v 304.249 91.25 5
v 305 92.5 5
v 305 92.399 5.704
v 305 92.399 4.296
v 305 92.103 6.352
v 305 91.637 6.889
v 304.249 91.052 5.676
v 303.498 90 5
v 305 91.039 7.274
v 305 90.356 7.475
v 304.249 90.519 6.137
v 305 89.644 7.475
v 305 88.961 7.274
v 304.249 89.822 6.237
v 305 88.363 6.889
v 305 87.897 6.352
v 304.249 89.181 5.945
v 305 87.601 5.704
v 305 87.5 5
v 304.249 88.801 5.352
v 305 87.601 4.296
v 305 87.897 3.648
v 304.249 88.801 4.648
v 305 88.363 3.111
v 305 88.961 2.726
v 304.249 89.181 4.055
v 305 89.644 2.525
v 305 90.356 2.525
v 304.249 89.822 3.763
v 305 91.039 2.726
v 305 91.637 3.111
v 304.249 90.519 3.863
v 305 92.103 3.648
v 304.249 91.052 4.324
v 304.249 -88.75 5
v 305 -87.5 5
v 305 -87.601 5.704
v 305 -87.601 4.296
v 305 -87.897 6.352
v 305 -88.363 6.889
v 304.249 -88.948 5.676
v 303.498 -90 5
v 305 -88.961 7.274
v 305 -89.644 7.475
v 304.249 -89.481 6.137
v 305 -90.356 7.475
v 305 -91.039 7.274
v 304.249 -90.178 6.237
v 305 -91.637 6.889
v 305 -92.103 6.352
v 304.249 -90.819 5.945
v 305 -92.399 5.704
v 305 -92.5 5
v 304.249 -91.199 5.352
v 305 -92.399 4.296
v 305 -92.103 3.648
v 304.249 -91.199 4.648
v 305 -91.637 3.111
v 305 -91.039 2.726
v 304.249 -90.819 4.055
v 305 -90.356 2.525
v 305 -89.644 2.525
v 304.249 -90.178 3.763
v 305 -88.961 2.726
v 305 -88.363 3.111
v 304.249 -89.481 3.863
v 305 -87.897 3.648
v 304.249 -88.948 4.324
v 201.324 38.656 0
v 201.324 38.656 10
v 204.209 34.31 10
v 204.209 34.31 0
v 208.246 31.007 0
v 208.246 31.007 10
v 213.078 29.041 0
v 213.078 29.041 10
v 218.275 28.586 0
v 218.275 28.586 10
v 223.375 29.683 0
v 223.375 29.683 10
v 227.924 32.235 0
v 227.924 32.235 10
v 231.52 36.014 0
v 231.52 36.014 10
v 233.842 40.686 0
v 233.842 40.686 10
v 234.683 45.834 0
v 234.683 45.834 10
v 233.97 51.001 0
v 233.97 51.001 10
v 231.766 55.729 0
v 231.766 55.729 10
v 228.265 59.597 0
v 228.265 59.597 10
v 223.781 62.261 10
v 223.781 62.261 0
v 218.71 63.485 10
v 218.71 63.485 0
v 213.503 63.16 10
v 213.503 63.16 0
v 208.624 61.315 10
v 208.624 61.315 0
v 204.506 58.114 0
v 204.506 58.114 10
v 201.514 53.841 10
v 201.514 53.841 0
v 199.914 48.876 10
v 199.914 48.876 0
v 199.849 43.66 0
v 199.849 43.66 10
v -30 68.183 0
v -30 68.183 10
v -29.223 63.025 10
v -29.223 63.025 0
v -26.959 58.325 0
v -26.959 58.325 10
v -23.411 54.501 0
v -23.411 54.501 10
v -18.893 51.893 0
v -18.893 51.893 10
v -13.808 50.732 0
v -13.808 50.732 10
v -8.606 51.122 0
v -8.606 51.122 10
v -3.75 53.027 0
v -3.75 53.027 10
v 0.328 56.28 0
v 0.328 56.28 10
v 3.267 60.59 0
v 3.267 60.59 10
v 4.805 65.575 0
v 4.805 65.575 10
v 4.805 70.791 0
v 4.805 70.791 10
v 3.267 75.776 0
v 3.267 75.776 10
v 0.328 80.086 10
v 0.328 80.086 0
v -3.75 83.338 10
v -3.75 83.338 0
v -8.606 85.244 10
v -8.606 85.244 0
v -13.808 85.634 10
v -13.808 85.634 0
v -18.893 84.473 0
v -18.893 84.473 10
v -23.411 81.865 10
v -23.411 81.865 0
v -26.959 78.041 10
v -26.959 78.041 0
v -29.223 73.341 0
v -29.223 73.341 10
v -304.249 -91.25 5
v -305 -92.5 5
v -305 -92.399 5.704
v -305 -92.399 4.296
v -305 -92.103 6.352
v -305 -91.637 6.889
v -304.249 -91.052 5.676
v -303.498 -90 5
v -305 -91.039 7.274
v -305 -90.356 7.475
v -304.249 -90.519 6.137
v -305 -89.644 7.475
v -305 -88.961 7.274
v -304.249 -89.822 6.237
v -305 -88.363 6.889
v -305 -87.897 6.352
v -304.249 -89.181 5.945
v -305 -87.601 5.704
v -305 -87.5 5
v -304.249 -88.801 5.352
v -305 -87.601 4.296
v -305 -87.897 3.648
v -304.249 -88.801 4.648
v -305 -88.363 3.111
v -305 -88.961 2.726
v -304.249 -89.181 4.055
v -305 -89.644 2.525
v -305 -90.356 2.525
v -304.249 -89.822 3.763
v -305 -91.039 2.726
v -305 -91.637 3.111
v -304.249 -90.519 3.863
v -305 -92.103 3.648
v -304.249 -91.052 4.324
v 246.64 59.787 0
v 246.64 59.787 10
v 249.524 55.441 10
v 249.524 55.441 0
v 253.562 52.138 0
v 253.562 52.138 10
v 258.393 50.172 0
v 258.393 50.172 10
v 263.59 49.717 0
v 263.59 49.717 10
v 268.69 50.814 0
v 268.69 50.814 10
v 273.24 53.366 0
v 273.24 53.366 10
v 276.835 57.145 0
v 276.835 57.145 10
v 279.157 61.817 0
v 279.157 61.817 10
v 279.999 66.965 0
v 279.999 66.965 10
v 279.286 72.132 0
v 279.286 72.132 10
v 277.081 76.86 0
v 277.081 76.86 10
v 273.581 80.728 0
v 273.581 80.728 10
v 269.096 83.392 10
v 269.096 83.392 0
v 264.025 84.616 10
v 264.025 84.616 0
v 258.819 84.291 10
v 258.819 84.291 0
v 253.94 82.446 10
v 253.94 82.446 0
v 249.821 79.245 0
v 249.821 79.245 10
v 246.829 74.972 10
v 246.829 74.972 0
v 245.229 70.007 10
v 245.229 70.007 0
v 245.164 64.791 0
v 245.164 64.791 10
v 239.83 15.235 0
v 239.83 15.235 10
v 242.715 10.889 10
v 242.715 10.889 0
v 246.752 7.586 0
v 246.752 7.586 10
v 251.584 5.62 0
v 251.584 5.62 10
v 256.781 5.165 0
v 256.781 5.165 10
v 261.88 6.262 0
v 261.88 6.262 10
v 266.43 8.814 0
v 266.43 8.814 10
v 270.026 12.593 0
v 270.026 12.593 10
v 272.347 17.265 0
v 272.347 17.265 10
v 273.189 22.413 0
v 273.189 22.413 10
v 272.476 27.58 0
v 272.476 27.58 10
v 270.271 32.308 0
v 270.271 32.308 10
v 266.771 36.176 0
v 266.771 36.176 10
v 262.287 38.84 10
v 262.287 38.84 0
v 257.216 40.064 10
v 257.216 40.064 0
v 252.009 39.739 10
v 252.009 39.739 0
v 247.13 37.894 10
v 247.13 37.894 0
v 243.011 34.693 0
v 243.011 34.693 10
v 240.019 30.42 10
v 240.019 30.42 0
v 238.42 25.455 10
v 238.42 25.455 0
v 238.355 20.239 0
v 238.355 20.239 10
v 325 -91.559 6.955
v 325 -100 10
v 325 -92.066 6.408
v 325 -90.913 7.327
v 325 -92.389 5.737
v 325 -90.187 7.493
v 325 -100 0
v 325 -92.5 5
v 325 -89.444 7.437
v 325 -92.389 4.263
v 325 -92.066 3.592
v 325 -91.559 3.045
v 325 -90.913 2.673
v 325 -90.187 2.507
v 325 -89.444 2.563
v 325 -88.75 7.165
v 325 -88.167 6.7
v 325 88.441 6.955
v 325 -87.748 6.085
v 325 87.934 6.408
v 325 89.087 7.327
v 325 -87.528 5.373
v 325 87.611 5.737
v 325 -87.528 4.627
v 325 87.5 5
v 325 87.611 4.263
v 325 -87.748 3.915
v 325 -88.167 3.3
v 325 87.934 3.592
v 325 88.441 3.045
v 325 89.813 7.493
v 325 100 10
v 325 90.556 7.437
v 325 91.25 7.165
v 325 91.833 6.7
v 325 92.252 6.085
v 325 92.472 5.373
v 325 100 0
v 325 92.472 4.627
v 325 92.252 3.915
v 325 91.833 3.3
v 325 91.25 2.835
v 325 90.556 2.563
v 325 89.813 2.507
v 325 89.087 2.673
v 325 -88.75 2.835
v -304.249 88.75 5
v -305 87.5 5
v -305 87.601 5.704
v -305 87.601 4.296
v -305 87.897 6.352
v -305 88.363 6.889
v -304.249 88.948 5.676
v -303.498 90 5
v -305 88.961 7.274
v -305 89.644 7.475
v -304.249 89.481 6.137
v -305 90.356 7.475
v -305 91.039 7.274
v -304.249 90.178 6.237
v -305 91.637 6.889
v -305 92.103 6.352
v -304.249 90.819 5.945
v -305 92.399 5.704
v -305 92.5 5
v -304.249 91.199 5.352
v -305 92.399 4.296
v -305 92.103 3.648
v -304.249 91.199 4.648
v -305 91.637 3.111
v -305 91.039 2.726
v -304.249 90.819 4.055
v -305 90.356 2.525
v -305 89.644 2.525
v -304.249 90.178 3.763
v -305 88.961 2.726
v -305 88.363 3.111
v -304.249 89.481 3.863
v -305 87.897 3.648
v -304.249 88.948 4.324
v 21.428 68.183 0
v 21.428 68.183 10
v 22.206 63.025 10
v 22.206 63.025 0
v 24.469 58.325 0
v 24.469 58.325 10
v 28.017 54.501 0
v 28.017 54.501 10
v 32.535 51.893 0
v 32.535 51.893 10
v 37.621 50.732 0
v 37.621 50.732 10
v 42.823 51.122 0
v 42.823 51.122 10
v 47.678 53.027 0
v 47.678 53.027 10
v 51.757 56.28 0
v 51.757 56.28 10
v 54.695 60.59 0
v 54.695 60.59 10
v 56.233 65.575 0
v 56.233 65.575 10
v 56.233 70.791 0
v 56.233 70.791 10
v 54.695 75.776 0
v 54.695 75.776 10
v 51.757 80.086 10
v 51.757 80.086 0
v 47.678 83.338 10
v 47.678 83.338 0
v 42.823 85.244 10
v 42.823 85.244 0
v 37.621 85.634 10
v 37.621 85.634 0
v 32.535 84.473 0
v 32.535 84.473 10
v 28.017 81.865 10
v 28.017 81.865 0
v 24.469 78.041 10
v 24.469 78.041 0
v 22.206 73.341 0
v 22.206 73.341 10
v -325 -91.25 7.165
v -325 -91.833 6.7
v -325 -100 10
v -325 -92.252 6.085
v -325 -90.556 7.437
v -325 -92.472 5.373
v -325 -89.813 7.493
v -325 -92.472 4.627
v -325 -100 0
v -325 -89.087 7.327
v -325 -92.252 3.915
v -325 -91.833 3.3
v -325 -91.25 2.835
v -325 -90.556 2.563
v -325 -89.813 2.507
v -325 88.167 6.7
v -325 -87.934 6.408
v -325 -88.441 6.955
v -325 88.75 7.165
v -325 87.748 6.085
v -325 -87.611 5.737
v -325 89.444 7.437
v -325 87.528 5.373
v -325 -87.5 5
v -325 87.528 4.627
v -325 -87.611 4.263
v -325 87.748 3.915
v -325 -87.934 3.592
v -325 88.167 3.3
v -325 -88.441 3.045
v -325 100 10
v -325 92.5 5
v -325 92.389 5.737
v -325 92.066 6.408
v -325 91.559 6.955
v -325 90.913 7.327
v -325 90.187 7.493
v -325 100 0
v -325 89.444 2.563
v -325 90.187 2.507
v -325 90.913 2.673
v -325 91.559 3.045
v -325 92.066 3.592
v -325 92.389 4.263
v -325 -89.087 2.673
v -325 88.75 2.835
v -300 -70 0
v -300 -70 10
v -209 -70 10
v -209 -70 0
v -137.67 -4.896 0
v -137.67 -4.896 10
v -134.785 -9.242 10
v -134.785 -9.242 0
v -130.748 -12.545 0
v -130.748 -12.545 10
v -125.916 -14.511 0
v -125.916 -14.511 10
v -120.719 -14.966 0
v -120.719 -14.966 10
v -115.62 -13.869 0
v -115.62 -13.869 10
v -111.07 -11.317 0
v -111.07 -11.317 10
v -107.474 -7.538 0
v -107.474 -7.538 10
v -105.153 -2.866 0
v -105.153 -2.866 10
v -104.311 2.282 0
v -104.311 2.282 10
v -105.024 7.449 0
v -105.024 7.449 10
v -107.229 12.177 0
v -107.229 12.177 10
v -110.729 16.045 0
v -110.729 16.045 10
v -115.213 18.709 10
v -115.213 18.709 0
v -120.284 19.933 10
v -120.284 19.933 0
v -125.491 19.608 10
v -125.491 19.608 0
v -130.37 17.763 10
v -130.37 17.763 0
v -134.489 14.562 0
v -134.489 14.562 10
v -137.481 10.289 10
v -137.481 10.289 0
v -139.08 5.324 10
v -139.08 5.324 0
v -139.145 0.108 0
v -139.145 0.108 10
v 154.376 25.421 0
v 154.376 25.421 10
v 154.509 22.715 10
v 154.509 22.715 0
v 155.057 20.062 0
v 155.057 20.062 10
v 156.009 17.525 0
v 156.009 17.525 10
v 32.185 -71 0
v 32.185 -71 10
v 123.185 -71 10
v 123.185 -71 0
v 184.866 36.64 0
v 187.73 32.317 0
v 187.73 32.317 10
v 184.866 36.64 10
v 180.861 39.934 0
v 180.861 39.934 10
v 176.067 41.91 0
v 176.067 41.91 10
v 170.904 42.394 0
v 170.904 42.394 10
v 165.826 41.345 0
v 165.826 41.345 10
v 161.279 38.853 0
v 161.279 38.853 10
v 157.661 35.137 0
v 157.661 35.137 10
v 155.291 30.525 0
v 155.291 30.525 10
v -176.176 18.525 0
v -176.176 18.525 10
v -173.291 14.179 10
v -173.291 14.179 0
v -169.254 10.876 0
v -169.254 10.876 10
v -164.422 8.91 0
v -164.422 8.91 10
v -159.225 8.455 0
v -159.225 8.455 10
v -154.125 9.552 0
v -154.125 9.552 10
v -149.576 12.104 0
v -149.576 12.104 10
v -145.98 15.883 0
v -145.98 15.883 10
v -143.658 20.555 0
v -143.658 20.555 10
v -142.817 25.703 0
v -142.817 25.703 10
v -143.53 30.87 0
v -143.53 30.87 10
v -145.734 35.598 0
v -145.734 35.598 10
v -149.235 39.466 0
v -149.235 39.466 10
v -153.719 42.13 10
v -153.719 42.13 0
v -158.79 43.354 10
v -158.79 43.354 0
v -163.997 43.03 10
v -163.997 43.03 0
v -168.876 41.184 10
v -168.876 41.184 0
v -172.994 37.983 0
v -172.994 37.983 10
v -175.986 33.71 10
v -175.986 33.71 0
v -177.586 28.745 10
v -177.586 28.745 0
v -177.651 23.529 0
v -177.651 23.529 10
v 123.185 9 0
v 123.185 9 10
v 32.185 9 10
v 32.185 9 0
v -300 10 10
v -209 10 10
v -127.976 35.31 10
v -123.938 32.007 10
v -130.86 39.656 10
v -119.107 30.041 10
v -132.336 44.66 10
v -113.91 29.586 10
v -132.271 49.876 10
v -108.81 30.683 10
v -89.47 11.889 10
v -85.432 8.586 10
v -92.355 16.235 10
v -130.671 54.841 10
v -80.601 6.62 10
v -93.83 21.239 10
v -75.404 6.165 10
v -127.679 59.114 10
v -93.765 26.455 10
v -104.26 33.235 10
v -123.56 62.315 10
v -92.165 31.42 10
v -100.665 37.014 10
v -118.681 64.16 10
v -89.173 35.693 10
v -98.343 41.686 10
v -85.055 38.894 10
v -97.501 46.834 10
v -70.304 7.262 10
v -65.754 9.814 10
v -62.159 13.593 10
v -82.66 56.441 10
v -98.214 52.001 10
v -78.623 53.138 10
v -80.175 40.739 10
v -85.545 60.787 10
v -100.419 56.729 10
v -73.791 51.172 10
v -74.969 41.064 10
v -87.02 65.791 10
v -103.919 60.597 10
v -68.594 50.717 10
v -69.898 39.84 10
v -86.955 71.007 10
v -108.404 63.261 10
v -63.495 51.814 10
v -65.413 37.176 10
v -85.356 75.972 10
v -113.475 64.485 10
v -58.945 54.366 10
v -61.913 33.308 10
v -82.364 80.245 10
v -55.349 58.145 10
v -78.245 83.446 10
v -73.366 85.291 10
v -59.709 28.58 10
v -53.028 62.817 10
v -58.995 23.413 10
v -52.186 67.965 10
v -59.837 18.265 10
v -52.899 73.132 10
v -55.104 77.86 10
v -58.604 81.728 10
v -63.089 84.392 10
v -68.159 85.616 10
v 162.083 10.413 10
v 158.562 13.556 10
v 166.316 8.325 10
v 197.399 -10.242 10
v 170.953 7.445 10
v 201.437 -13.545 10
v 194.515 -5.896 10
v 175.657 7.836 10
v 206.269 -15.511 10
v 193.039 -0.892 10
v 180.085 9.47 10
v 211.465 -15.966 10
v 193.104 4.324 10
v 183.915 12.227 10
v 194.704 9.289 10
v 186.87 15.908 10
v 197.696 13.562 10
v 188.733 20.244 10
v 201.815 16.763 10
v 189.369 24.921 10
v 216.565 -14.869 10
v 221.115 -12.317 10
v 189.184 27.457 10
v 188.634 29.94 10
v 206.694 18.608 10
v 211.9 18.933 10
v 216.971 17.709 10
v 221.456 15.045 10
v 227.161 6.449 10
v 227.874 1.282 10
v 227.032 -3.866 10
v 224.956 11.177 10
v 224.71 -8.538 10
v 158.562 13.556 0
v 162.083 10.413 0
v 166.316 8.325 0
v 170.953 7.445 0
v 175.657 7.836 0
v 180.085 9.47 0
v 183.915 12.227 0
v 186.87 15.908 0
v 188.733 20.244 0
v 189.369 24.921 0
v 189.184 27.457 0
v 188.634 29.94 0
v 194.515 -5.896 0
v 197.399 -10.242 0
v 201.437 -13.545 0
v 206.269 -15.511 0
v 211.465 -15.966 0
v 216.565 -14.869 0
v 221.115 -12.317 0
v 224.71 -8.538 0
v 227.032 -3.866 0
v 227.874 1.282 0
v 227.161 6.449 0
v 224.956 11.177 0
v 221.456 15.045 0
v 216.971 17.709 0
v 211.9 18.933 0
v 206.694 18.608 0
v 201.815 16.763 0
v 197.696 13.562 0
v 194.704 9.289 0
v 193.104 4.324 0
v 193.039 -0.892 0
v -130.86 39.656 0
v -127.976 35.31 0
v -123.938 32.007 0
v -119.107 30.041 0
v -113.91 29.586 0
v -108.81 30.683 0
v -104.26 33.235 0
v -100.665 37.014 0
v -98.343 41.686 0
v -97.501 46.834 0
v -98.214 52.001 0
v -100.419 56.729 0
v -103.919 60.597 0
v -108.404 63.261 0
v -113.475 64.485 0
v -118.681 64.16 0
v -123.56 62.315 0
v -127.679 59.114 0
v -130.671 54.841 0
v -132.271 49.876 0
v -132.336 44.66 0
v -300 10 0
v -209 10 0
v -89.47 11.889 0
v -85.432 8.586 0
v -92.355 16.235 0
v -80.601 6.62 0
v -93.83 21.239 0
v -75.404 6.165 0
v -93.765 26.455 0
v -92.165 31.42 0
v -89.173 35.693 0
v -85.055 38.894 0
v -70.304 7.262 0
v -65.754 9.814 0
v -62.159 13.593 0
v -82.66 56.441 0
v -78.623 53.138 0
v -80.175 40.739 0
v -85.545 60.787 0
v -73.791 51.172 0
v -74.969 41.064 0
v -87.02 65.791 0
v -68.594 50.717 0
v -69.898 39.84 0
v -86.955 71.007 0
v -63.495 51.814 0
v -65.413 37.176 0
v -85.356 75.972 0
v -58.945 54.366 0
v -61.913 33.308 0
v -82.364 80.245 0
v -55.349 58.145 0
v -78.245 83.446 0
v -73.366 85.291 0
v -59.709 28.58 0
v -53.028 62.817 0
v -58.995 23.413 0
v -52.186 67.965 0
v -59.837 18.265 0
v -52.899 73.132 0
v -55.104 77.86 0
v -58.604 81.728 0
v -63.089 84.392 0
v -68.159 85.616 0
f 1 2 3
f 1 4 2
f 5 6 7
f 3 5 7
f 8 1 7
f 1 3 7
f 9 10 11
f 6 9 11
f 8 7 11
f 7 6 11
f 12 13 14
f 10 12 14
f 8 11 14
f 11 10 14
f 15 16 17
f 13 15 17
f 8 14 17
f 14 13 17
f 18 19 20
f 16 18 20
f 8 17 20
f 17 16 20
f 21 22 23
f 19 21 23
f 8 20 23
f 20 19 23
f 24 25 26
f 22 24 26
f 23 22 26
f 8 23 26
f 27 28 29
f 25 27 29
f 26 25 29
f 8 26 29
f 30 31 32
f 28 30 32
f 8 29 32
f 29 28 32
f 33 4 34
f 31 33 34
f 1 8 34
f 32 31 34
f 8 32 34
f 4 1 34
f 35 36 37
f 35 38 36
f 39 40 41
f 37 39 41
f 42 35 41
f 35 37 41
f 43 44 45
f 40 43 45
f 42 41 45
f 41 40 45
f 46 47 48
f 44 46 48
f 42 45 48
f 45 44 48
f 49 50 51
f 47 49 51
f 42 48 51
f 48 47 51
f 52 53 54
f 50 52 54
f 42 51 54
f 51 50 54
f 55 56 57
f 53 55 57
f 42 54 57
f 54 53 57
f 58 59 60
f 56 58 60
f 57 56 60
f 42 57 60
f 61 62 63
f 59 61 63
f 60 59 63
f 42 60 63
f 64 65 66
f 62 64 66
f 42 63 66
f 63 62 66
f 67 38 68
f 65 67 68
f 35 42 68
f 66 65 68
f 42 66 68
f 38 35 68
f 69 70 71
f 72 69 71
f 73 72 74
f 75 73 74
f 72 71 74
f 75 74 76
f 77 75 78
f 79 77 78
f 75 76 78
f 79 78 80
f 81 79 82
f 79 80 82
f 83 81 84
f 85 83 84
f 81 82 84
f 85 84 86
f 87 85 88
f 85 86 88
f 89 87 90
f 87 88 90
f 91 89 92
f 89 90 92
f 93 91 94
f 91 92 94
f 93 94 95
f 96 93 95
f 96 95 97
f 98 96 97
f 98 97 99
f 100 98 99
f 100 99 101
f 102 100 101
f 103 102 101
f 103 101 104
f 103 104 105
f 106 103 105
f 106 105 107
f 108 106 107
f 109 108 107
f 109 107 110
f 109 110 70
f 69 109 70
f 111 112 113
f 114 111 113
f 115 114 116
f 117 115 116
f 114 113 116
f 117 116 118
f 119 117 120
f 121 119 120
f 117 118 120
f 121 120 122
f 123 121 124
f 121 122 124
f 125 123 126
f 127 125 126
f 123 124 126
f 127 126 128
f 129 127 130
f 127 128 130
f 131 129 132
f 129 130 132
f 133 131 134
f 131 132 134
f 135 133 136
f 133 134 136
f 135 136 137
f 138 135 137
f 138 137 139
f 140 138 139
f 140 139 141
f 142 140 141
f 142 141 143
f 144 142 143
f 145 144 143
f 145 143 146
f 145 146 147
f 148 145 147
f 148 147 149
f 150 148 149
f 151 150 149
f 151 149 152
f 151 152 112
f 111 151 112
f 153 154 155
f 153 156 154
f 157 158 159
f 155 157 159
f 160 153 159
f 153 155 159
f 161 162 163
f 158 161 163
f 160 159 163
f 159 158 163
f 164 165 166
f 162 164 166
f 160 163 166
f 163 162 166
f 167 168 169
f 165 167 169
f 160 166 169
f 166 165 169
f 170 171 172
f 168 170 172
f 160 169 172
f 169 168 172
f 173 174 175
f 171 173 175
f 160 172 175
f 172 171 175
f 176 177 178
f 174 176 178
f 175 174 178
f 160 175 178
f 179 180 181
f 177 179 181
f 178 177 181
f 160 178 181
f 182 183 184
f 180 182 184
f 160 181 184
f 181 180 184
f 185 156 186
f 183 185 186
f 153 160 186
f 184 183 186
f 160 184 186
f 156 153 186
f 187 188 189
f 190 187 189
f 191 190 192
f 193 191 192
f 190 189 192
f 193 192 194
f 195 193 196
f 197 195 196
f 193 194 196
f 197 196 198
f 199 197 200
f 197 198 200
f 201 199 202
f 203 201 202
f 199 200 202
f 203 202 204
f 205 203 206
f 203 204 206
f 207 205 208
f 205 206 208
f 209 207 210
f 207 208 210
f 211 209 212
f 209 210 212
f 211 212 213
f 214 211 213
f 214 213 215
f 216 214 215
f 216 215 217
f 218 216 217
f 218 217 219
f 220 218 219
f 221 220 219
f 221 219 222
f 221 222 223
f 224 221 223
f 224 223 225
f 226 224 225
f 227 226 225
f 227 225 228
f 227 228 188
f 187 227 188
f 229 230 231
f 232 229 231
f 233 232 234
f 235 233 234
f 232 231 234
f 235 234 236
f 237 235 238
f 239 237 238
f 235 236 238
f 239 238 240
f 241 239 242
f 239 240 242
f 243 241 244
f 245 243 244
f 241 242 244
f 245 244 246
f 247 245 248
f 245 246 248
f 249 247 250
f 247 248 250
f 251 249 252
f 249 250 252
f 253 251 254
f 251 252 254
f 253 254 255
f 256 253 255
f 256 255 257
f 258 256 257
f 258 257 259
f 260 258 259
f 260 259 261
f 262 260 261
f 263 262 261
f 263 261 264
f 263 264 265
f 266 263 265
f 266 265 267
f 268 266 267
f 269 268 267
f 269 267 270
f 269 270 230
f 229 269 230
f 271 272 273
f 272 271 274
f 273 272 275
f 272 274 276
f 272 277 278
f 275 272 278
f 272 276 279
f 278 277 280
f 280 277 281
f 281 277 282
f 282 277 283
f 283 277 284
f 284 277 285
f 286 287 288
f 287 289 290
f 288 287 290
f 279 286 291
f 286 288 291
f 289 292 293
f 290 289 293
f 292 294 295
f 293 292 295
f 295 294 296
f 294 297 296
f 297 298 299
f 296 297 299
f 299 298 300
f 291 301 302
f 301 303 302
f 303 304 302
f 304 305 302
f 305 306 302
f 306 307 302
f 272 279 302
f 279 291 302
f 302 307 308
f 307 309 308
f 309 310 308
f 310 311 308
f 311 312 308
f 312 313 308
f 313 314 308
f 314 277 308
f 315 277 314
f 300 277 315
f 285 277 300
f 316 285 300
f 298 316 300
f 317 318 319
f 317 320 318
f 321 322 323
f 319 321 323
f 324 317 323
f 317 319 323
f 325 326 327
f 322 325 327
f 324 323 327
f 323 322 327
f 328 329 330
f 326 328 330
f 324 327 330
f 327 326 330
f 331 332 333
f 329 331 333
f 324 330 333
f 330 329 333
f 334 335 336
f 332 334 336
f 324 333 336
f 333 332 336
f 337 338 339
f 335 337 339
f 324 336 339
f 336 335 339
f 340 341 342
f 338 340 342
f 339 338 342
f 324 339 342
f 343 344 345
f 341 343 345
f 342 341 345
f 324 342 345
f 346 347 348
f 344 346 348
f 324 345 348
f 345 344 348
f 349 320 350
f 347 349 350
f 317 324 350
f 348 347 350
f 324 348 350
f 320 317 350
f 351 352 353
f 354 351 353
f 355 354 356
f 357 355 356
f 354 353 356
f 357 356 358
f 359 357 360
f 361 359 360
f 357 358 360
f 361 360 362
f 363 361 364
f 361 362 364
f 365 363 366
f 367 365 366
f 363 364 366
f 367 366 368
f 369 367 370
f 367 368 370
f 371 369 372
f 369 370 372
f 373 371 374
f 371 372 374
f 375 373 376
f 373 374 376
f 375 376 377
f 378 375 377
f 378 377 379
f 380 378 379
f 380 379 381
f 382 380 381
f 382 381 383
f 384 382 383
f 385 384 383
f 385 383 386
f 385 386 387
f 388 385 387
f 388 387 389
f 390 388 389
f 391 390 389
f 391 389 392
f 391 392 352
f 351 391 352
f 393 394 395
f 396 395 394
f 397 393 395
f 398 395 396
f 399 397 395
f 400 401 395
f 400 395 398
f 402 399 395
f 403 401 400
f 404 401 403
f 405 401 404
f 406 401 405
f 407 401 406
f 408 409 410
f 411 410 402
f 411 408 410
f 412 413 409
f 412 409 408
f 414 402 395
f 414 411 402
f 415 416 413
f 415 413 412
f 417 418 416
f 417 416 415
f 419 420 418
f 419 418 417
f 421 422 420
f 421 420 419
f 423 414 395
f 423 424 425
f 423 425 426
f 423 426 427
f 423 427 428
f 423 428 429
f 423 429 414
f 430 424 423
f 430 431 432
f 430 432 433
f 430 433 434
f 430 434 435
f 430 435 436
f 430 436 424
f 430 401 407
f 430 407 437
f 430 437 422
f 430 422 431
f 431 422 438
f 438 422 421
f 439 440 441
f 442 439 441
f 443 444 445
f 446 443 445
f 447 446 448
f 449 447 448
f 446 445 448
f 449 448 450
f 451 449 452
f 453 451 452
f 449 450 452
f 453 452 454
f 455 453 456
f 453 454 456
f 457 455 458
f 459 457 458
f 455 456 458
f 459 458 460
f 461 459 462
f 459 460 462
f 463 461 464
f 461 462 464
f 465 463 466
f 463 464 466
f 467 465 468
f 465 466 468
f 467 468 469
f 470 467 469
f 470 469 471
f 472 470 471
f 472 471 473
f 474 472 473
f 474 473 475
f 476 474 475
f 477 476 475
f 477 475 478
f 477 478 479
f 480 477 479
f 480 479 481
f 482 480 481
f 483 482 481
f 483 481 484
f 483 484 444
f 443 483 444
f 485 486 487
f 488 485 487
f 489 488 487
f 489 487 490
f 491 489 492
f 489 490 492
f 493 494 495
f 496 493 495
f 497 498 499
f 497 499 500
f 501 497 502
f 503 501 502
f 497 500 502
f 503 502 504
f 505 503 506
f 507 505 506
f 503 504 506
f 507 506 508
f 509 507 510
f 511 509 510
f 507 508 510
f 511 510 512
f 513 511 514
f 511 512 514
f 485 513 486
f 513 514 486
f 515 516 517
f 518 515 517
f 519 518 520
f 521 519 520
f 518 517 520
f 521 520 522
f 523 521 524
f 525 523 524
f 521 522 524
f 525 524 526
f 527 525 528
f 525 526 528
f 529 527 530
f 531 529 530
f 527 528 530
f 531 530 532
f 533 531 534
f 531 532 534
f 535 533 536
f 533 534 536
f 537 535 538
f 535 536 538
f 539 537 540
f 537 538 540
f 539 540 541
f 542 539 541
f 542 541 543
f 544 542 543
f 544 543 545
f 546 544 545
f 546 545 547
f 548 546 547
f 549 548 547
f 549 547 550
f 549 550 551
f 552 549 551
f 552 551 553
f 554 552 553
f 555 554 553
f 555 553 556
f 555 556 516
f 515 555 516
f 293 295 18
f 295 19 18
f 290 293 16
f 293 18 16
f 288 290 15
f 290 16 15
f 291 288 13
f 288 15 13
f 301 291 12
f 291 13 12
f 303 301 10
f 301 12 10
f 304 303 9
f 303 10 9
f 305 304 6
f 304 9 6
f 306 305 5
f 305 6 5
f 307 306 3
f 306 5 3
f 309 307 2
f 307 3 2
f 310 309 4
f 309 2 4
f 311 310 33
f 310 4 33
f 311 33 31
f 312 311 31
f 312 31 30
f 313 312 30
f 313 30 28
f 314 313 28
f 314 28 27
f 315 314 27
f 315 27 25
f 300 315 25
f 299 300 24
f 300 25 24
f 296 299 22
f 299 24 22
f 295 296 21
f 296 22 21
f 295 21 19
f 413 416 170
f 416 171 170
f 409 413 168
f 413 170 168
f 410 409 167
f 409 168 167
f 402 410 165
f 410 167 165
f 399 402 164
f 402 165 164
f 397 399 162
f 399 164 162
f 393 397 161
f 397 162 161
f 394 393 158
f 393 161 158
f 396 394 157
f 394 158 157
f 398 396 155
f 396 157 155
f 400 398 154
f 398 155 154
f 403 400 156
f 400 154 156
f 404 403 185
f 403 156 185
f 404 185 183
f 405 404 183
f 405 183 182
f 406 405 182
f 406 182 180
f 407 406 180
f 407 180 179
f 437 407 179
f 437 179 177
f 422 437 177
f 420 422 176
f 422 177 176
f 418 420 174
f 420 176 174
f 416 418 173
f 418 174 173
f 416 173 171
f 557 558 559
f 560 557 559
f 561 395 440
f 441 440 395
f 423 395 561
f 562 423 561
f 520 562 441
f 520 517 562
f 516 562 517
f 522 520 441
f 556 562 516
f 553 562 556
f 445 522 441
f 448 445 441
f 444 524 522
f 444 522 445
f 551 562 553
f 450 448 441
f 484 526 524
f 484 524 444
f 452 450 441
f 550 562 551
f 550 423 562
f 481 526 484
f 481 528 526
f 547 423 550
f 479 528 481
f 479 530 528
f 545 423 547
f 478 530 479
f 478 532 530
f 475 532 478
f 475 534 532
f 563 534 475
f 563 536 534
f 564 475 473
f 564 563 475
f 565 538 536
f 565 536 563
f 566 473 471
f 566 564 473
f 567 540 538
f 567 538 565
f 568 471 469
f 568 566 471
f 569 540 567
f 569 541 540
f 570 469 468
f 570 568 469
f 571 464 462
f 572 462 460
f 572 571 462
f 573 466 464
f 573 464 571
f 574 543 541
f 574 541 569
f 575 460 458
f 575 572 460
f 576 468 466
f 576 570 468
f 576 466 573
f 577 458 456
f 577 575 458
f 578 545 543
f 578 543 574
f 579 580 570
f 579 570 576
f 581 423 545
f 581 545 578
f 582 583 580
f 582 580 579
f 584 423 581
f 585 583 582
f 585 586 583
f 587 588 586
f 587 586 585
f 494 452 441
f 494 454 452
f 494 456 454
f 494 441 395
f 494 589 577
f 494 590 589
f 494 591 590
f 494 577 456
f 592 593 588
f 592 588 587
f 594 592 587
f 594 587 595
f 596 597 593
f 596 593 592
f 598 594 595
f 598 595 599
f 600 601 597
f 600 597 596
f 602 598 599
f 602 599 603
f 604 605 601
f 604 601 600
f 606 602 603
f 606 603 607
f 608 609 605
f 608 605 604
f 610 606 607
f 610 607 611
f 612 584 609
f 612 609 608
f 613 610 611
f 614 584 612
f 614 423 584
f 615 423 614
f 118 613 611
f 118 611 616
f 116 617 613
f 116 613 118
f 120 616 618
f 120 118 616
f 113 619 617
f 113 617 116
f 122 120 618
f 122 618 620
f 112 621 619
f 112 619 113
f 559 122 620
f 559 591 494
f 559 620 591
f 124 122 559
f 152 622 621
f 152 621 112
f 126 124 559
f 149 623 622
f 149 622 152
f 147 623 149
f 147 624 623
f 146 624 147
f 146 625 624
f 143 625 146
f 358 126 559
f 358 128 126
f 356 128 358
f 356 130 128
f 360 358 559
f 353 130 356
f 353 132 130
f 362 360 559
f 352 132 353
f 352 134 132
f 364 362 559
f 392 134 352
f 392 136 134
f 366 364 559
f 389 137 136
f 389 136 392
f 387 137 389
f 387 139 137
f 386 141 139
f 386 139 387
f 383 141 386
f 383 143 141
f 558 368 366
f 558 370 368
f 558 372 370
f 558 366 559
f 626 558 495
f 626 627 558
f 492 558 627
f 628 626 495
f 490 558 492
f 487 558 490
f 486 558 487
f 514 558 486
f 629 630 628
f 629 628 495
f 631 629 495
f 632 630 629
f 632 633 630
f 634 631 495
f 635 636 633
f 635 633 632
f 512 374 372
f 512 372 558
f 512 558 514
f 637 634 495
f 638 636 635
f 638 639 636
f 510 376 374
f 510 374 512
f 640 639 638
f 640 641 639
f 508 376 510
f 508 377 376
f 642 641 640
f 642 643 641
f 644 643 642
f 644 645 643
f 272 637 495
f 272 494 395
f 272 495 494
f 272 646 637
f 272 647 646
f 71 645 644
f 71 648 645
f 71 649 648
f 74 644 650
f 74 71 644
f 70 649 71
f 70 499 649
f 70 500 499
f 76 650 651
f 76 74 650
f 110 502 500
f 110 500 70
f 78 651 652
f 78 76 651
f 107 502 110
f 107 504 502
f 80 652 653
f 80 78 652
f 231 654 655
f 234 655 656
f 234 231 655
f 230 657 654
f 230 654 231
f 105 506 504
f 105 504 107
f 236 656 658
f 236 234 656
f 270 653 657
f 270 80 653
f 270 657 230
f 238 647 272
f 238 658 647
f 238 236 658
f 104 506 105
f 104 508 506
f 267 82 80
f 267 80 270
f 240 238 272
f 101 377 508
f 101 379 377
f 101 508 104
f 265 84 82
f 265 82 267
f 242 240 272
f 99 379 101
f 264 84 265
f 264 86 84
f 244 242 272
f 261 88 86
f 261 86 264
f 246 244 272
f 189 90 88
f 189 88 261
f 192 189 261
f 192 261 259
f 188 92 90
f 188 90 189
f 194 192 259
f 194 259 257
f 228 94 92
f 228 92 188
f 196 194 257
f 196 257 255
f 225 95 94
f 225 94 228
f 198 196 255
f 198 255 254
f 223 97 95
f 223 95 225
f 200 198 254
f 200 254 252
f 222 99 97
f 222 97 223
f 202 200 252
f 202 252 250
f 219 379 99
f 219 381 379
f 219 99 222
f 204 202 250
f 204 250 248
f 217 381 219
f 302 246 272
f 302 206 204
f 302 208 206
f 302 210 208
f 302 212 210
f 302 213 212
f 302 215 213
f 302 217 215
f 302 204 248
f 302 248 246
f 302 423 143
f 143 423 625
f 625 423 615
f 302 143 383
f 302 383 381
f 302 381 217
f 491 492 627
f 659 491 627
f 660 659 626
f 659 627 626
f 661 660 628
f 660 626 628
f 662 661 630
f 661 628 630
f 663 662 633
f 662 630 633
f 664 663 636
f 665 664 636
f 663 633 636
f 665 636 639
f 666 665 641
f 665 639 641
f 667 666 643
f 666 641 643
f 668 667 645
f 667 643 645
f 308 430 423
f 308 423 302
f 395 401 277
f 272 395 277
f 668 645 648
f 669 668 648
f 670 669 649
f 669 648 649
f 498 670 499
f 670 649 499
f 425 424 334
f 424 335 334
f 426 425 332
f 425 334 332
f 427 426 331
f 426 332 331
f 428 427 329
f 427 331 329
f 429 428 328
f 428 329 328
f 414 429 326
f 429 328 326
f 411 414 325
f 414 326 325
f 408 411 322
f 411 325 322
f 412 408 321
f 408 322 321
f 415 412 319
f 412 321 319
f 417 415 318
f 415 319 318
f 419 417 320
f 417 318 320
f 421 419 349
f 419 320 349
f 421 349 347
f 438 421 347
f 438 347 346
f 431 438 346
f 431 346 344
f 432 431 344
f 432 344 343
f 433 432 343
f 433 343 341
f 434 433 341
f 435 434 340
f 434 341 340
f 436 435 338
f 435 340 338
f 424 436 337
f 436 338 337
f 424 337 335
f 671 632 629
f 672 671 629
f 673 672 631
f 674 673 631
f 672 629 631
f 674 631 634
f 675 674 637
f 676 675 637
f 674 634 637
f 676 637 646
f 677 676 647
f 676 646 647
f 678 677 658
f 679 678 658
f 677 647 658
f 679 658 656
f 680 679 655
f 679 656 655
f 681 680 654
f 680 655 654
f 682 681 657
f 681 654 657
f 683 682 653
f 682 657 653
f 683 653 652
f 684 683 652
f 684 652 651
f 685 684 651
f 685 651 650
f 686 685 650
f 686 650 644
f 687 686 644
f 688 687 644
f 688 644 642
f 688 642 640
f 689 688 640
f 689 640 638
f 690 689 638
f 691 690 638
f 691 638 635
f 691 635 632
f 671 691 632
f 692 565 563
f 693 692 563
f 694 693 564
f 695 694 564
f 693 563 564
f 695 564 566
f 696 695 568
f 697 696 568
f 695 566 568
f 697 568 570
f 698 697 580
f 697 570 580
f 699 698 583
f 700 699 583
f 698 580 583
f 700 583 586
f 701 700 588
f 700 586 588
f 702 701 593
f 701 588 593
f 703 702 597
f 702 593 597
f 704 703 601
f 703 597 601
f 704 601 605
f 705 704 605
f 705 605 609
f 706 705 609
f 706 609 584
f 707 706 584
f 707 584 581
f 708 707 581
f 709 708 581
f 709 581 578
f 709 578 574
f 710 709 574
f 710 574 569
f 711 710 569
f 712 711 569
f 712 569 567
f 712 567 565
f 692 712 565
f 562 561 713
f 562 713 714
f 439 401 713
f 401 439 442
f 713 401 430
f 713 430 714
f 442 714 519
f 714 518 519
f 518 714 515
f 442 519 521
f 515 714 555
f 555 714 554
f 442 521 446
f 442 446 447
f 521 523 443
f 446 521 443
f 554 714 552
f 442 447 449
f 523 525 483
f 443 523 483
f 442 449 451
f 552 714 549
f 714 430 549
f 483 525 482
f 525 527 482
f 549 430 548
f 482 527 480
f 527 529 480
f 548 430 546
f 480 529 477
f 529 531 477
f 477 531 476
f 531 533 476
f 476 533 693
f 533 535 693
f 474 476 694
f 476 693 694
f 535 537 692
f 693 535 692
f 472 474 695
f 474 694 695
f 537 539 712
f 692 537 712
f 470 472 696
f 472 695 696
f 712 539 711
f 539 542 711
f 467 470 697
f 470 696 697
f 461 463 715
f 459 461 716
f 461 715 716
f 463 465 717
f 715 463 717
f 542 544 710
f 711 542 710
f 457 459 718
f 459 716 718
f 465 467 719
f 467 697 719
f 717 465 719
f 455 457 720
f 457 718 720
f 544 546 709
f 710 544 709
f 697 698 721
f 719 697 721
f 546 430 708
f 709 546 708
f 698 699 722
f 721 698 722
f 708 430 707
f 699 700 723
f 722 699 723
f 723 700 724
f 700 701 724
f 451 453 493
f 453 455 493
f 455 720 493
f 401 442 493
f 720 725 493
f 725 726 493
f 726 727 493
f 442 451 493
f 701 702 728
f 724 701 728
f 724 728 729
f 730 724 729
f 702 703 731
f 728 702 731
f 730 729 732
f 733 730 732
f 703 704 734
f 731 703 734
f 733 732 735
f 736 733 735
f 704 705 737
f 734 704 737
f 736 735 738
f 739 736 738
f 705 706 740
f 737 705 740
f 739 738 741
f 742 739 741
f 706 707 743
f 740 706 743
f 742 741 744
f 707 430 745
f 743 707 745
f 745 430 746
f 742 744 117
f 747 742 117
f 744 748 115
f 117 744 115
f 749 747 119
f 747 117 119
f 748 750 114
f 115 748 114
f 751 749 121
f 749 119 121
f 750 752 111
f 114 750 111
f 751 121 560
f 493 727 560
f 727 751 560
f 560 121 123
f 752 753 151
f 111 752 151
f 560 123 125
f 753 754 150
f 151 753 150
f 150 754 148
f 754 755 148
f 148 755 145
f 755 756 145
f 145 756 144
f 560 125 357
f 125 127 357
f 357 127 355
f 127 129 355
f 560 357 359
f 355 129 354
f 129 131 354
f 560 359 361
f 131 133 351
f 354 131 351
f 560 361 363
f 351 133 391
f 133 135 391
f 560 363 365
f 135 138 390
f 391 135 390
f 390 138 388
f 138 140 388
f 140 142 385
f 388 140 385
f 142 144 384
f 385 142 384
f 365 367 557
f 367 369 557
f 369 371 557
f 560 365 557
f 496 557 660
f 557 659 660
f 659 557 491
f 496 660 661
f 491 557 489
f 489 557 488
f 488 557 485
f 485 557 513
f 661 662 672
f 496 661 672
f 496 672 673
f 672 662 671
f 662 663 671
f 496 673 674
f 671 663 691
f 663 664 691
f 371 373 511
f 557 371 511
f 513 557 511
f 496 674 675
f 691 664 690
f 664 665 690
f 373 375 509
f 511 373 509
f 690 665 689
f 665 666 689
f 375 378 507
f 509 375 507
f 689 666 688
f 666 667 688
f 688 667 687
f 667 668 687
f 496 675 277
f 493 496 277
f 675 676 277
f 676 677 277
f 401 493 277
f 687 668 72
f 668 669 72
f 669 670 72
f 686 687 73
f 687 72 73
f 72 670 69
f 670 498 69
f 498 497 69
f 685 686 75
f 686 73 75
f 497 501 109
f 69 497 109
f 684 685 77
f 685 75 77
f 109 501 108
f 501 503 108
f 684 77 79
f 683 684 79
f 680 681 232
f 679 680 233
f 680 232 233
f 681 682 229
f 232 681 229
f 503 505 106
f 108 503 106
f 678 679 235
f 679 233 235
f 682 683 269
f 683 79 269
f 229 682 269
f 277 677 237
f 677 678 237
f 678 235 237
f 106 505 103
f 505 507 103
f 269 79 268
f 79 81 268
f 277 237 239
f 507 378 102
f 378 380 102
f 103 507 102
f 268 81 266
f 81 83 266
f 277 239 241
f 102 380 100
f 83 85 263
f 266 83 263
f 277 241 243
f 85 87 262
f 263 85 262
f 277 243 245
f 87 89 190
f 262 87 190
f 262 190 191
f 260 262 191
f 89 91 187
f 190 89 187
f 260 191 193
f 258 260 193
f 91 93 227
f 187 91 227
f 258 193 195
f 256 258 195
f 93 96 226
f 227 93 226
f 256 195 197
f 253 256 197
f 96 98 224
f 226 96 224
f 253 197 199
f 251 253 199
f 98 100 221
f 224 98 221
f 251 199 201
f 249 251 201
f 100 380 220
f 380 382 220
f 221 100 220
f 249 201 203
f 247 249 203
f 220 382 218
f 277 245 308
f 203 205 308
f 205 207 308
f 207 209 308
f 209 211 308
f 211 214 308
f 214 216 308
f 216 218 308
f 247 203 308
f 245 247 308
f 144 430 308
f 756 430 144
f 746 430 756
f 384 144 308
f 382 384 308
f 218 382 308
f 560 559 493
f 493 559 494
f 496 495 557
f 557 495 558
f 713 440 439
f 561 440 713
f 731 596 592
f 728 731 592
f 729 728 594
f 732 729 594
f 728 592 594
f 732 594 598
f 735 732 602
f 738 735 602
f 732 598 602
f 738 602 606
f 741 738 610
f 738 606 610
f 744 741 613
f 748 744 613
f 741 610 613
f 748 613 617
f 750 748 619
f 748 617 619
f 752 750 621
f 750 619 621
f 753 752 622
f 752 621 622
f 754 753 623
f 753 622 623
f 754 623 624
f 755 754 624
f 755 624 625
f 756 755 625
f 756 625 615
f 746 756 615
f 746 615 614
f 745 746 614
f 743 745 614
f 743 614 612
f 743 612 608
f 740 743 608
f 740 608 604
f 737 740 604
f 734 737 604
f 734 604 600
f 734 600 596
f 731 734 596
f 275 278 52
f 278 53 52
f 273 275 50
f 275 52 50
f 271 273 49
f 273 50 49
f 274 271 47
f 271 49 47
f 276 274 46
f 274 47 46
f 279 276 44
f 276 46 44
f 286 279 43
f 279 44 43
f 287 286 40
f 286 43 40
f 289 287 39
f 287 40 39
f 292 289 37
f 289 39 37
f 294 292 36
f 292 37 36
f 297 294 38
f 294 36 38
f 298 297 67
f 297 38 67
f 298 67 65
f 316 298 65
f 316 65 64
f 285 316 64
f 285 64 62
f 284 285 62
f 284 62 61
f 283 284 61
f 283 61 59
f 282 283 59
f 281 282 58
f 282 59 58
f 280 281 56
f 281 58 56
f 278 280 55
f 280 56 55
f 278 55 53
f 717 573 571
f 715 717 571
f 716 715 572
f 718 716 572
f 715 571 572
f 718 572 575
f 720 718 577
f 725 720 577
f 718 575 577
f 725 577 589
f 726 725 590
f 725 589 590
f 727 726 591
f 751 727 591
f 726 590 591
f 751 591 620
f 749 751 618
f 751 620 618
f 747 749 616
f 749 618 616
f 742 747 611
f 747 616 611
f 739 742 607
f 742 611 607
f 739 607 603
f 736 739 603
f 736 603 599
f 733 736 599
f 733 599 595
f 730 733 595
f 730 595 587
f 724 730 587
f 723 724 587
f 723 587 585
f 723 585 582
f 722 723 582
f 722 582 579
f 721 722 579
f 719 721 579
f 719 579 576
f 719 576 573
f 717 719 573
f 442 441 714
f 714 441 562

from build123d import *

# Parameters (mm, degrees)
F0_W           = 650
F0_H           = 200
F1_DEPTH       = 10
F4_D           = 5
F4_DEPTH       = 20
F4_TIP         = 1.5021515476
F4_ON_F3_D     = 5
F4_ON_F3_DEPTH = 20
F4_ON_F3_TIP   = 1.5021515476
F5_W           = 91
F5_H           = 80
F6_DEPTH       = 25


with BuildPart() as f1:
    # F0 (on Top) → F1 (new body)
    with BuildSketch(Plane.XY):
        Rectangle(F0_W, F0_H)
    extrude(amount=F1_DEPTH)

    # F4
    with Locations(Plane.YZ.offset(325)):
        with Locations((90, 5), (-90, 5)):
            Hole(F4_D / 2, depth=F4_DEPTH)
            with Locations((0, 0, -(F4_DEPTH + F4_TIP / 2))):  # 118° drill point
                Cone(0, F4_D / 2, F4_TIP, mode=Mode.SUBTRACT)

    # F4 on F3
    with Locations(Plane(origin=(-325, 0, 0), x_dir=(0, -1, 0), z_dir=(-1, 0, 0))):
        with Locations((90, 5), (-90, 5)):
            Hole(F4_ON_F3_D / 2, depth=F4_ON_F3_DEPTH)
            with Locations((0, 0, -(F4_ON_F3_DEPTH + F4_ON_F3_TIP / 2))):  # 118° drill point
                Cone(0, F4_ON_F3_D / 2, F4_ON_F3_TIP, mode=Mode.SUBTRACT)

    # F5 (on face) → F6 (cut)
    with BuildSketch(Plane.XY.offset(10)):
        with BuildLine():
            ThreePointArc((-144.4550033747, 33.3169048253), (-167.7112094275, 41.7814723445), (-176.1757760637, 18.5252659703))
            ThreePointArc((-176.1757760637, 18.5252659703), (-152.9195705725, 10.0606996555), (-144.4550033747, 33.3169048253))
        make_face()
        with BuildLine():
            ThreePointArc((-99.1396139363, 54.4478180297), (-122.3958194275, 62.9123843445), (-130.8603866253, 39.6561791747))
            ThreePointArc((-130.8603866253, 39.6561791747), (-107.6041805725, 31.1916116555), (-99.1396139363, 54.4478180297))
        make_face()
        with BuildLine():
            ThreePointArc((-60.6337345533, 31.0267332083), (-83.889940619, 39.4913002552), (-92.3545070637, 16.2350939703))
            ThreePointArc((-92.3545070637, 16.2350939703), (-69.098301381, 7.7705277448), (-60.6337345533, 31.0267332083))
        make_face()
        with BuildLine():
            ThreePointArc((-105.9491247577, 9.8958196467), (-129.2053308382, 18.360386153), (-137.6698970637, -4.8958200297))
            ThreePointArc((-137.6698970637, -4.8958200297), (-114.4136911618, -13.360386153), (-105.9491247577, 9.8958196467))
        make_face()
        with BuildLine():
            ThreePointArc((-53.8242245533, 75.5787312083), (-77.080430619, 84.0432982552), (-85.5449970637, 60.7870919703))
            ThreePointArc((-85.5449970637, 60.7870919703), (-62.288791381, 52.3225257448), (-53.8242245533, 75.5787312083))
        make_face()
        with Locations((-254.5, -30)):
            Rectangle(F5_W, F5_H)
        with BuildLine():
            ThreePointArc((189.369221, 24.921086), (188.954401169, 28.7087790435), (187.7296074467, 32.3169052083))
            ThreePointArc((187.7296074467, 32.3169052083), (168.3260134713, 42.0586377624), (154.3763653155, 25.421086))
            ThreePointArc((154.3763653155, 25.421086), (154.7316693294, 21.3778780275), (156.0088349363, 17.5252659703))
            ThreePointArc((156.0088349363, 17.5252659703), (175.6569144859, 7.835905929), (189.369221, 24.921086))
        make_face()
        with BuildLine():
            ThreePointArc((233.0449962423, 53.4478176467), (209.7887905725, 61.9123843445), (201.3242235533, 38.6561787917))
            ThreePointArc((201.3242235533, 38.6561787917), (224.5804294275, 30.1916116555), (233.0449962423, 53.4478176467))
        make_face()
        with BuildLine():
            ThreePointArc((271.5508764467, 30.0267332083), (248.2946705725, 38.4913003445), (239.8301037577, 15.2350943533))
            ThreePointArc((239.8301037577, 15.2350943533), (263.0863094275, 6.7705276555), (271.5508764467, 30.0267332083))
        make_face()
        with BuildLine():
            ThreePointArc((226.2354870637, 8.8958200297), (202.9792811618, 17.360386153), (194.5147147577, -5.8958196467))
            ThreePointArc((194.5147147577, -5.8958196467), (217.7709208382, -14.360386153), (226.2354870637, 8.8958200297))
        make_face()
        with BuildLine():
            ThreePointArc((278.3603856253, 74.5787308253), (255.1041795725, 83.0432983445), (246.6396129363, 59.7870919703))
            ThreePointArc((246.6396129363, 59.7870919703), (269.8958184275, 51.3225256555), (278.3603856253, 74.5787308253))
        make_face()
        Polygon((32.18461, -70), (32.18461, -71), (123.18461, -71), (123.18461, -70), (123.18461, 9), (32.18461, 9), align=None)
        with BuildLine():
            ThreePointArc((5, 68.182912), (-12.5, 85.682912), (-30, 68.182912))
            ThreePointArc((-30, 68.182912), (-12.5, 50.682912), (5, 68.182912))
        make_face()
        with BuildLine():
            ThreePointArc((56.428404, 68.182912), (38.928404, 85.682912), (21.428404, 68.182912))
            ThreePointArc((21.428404, 68.182912), (38.928404, 50.682912), (56.428404, 68.182912))
        make_face()
    extrude(amount=-F6_DEPTH, mode=Mode.SUBTRACT)


solid = f1.part
